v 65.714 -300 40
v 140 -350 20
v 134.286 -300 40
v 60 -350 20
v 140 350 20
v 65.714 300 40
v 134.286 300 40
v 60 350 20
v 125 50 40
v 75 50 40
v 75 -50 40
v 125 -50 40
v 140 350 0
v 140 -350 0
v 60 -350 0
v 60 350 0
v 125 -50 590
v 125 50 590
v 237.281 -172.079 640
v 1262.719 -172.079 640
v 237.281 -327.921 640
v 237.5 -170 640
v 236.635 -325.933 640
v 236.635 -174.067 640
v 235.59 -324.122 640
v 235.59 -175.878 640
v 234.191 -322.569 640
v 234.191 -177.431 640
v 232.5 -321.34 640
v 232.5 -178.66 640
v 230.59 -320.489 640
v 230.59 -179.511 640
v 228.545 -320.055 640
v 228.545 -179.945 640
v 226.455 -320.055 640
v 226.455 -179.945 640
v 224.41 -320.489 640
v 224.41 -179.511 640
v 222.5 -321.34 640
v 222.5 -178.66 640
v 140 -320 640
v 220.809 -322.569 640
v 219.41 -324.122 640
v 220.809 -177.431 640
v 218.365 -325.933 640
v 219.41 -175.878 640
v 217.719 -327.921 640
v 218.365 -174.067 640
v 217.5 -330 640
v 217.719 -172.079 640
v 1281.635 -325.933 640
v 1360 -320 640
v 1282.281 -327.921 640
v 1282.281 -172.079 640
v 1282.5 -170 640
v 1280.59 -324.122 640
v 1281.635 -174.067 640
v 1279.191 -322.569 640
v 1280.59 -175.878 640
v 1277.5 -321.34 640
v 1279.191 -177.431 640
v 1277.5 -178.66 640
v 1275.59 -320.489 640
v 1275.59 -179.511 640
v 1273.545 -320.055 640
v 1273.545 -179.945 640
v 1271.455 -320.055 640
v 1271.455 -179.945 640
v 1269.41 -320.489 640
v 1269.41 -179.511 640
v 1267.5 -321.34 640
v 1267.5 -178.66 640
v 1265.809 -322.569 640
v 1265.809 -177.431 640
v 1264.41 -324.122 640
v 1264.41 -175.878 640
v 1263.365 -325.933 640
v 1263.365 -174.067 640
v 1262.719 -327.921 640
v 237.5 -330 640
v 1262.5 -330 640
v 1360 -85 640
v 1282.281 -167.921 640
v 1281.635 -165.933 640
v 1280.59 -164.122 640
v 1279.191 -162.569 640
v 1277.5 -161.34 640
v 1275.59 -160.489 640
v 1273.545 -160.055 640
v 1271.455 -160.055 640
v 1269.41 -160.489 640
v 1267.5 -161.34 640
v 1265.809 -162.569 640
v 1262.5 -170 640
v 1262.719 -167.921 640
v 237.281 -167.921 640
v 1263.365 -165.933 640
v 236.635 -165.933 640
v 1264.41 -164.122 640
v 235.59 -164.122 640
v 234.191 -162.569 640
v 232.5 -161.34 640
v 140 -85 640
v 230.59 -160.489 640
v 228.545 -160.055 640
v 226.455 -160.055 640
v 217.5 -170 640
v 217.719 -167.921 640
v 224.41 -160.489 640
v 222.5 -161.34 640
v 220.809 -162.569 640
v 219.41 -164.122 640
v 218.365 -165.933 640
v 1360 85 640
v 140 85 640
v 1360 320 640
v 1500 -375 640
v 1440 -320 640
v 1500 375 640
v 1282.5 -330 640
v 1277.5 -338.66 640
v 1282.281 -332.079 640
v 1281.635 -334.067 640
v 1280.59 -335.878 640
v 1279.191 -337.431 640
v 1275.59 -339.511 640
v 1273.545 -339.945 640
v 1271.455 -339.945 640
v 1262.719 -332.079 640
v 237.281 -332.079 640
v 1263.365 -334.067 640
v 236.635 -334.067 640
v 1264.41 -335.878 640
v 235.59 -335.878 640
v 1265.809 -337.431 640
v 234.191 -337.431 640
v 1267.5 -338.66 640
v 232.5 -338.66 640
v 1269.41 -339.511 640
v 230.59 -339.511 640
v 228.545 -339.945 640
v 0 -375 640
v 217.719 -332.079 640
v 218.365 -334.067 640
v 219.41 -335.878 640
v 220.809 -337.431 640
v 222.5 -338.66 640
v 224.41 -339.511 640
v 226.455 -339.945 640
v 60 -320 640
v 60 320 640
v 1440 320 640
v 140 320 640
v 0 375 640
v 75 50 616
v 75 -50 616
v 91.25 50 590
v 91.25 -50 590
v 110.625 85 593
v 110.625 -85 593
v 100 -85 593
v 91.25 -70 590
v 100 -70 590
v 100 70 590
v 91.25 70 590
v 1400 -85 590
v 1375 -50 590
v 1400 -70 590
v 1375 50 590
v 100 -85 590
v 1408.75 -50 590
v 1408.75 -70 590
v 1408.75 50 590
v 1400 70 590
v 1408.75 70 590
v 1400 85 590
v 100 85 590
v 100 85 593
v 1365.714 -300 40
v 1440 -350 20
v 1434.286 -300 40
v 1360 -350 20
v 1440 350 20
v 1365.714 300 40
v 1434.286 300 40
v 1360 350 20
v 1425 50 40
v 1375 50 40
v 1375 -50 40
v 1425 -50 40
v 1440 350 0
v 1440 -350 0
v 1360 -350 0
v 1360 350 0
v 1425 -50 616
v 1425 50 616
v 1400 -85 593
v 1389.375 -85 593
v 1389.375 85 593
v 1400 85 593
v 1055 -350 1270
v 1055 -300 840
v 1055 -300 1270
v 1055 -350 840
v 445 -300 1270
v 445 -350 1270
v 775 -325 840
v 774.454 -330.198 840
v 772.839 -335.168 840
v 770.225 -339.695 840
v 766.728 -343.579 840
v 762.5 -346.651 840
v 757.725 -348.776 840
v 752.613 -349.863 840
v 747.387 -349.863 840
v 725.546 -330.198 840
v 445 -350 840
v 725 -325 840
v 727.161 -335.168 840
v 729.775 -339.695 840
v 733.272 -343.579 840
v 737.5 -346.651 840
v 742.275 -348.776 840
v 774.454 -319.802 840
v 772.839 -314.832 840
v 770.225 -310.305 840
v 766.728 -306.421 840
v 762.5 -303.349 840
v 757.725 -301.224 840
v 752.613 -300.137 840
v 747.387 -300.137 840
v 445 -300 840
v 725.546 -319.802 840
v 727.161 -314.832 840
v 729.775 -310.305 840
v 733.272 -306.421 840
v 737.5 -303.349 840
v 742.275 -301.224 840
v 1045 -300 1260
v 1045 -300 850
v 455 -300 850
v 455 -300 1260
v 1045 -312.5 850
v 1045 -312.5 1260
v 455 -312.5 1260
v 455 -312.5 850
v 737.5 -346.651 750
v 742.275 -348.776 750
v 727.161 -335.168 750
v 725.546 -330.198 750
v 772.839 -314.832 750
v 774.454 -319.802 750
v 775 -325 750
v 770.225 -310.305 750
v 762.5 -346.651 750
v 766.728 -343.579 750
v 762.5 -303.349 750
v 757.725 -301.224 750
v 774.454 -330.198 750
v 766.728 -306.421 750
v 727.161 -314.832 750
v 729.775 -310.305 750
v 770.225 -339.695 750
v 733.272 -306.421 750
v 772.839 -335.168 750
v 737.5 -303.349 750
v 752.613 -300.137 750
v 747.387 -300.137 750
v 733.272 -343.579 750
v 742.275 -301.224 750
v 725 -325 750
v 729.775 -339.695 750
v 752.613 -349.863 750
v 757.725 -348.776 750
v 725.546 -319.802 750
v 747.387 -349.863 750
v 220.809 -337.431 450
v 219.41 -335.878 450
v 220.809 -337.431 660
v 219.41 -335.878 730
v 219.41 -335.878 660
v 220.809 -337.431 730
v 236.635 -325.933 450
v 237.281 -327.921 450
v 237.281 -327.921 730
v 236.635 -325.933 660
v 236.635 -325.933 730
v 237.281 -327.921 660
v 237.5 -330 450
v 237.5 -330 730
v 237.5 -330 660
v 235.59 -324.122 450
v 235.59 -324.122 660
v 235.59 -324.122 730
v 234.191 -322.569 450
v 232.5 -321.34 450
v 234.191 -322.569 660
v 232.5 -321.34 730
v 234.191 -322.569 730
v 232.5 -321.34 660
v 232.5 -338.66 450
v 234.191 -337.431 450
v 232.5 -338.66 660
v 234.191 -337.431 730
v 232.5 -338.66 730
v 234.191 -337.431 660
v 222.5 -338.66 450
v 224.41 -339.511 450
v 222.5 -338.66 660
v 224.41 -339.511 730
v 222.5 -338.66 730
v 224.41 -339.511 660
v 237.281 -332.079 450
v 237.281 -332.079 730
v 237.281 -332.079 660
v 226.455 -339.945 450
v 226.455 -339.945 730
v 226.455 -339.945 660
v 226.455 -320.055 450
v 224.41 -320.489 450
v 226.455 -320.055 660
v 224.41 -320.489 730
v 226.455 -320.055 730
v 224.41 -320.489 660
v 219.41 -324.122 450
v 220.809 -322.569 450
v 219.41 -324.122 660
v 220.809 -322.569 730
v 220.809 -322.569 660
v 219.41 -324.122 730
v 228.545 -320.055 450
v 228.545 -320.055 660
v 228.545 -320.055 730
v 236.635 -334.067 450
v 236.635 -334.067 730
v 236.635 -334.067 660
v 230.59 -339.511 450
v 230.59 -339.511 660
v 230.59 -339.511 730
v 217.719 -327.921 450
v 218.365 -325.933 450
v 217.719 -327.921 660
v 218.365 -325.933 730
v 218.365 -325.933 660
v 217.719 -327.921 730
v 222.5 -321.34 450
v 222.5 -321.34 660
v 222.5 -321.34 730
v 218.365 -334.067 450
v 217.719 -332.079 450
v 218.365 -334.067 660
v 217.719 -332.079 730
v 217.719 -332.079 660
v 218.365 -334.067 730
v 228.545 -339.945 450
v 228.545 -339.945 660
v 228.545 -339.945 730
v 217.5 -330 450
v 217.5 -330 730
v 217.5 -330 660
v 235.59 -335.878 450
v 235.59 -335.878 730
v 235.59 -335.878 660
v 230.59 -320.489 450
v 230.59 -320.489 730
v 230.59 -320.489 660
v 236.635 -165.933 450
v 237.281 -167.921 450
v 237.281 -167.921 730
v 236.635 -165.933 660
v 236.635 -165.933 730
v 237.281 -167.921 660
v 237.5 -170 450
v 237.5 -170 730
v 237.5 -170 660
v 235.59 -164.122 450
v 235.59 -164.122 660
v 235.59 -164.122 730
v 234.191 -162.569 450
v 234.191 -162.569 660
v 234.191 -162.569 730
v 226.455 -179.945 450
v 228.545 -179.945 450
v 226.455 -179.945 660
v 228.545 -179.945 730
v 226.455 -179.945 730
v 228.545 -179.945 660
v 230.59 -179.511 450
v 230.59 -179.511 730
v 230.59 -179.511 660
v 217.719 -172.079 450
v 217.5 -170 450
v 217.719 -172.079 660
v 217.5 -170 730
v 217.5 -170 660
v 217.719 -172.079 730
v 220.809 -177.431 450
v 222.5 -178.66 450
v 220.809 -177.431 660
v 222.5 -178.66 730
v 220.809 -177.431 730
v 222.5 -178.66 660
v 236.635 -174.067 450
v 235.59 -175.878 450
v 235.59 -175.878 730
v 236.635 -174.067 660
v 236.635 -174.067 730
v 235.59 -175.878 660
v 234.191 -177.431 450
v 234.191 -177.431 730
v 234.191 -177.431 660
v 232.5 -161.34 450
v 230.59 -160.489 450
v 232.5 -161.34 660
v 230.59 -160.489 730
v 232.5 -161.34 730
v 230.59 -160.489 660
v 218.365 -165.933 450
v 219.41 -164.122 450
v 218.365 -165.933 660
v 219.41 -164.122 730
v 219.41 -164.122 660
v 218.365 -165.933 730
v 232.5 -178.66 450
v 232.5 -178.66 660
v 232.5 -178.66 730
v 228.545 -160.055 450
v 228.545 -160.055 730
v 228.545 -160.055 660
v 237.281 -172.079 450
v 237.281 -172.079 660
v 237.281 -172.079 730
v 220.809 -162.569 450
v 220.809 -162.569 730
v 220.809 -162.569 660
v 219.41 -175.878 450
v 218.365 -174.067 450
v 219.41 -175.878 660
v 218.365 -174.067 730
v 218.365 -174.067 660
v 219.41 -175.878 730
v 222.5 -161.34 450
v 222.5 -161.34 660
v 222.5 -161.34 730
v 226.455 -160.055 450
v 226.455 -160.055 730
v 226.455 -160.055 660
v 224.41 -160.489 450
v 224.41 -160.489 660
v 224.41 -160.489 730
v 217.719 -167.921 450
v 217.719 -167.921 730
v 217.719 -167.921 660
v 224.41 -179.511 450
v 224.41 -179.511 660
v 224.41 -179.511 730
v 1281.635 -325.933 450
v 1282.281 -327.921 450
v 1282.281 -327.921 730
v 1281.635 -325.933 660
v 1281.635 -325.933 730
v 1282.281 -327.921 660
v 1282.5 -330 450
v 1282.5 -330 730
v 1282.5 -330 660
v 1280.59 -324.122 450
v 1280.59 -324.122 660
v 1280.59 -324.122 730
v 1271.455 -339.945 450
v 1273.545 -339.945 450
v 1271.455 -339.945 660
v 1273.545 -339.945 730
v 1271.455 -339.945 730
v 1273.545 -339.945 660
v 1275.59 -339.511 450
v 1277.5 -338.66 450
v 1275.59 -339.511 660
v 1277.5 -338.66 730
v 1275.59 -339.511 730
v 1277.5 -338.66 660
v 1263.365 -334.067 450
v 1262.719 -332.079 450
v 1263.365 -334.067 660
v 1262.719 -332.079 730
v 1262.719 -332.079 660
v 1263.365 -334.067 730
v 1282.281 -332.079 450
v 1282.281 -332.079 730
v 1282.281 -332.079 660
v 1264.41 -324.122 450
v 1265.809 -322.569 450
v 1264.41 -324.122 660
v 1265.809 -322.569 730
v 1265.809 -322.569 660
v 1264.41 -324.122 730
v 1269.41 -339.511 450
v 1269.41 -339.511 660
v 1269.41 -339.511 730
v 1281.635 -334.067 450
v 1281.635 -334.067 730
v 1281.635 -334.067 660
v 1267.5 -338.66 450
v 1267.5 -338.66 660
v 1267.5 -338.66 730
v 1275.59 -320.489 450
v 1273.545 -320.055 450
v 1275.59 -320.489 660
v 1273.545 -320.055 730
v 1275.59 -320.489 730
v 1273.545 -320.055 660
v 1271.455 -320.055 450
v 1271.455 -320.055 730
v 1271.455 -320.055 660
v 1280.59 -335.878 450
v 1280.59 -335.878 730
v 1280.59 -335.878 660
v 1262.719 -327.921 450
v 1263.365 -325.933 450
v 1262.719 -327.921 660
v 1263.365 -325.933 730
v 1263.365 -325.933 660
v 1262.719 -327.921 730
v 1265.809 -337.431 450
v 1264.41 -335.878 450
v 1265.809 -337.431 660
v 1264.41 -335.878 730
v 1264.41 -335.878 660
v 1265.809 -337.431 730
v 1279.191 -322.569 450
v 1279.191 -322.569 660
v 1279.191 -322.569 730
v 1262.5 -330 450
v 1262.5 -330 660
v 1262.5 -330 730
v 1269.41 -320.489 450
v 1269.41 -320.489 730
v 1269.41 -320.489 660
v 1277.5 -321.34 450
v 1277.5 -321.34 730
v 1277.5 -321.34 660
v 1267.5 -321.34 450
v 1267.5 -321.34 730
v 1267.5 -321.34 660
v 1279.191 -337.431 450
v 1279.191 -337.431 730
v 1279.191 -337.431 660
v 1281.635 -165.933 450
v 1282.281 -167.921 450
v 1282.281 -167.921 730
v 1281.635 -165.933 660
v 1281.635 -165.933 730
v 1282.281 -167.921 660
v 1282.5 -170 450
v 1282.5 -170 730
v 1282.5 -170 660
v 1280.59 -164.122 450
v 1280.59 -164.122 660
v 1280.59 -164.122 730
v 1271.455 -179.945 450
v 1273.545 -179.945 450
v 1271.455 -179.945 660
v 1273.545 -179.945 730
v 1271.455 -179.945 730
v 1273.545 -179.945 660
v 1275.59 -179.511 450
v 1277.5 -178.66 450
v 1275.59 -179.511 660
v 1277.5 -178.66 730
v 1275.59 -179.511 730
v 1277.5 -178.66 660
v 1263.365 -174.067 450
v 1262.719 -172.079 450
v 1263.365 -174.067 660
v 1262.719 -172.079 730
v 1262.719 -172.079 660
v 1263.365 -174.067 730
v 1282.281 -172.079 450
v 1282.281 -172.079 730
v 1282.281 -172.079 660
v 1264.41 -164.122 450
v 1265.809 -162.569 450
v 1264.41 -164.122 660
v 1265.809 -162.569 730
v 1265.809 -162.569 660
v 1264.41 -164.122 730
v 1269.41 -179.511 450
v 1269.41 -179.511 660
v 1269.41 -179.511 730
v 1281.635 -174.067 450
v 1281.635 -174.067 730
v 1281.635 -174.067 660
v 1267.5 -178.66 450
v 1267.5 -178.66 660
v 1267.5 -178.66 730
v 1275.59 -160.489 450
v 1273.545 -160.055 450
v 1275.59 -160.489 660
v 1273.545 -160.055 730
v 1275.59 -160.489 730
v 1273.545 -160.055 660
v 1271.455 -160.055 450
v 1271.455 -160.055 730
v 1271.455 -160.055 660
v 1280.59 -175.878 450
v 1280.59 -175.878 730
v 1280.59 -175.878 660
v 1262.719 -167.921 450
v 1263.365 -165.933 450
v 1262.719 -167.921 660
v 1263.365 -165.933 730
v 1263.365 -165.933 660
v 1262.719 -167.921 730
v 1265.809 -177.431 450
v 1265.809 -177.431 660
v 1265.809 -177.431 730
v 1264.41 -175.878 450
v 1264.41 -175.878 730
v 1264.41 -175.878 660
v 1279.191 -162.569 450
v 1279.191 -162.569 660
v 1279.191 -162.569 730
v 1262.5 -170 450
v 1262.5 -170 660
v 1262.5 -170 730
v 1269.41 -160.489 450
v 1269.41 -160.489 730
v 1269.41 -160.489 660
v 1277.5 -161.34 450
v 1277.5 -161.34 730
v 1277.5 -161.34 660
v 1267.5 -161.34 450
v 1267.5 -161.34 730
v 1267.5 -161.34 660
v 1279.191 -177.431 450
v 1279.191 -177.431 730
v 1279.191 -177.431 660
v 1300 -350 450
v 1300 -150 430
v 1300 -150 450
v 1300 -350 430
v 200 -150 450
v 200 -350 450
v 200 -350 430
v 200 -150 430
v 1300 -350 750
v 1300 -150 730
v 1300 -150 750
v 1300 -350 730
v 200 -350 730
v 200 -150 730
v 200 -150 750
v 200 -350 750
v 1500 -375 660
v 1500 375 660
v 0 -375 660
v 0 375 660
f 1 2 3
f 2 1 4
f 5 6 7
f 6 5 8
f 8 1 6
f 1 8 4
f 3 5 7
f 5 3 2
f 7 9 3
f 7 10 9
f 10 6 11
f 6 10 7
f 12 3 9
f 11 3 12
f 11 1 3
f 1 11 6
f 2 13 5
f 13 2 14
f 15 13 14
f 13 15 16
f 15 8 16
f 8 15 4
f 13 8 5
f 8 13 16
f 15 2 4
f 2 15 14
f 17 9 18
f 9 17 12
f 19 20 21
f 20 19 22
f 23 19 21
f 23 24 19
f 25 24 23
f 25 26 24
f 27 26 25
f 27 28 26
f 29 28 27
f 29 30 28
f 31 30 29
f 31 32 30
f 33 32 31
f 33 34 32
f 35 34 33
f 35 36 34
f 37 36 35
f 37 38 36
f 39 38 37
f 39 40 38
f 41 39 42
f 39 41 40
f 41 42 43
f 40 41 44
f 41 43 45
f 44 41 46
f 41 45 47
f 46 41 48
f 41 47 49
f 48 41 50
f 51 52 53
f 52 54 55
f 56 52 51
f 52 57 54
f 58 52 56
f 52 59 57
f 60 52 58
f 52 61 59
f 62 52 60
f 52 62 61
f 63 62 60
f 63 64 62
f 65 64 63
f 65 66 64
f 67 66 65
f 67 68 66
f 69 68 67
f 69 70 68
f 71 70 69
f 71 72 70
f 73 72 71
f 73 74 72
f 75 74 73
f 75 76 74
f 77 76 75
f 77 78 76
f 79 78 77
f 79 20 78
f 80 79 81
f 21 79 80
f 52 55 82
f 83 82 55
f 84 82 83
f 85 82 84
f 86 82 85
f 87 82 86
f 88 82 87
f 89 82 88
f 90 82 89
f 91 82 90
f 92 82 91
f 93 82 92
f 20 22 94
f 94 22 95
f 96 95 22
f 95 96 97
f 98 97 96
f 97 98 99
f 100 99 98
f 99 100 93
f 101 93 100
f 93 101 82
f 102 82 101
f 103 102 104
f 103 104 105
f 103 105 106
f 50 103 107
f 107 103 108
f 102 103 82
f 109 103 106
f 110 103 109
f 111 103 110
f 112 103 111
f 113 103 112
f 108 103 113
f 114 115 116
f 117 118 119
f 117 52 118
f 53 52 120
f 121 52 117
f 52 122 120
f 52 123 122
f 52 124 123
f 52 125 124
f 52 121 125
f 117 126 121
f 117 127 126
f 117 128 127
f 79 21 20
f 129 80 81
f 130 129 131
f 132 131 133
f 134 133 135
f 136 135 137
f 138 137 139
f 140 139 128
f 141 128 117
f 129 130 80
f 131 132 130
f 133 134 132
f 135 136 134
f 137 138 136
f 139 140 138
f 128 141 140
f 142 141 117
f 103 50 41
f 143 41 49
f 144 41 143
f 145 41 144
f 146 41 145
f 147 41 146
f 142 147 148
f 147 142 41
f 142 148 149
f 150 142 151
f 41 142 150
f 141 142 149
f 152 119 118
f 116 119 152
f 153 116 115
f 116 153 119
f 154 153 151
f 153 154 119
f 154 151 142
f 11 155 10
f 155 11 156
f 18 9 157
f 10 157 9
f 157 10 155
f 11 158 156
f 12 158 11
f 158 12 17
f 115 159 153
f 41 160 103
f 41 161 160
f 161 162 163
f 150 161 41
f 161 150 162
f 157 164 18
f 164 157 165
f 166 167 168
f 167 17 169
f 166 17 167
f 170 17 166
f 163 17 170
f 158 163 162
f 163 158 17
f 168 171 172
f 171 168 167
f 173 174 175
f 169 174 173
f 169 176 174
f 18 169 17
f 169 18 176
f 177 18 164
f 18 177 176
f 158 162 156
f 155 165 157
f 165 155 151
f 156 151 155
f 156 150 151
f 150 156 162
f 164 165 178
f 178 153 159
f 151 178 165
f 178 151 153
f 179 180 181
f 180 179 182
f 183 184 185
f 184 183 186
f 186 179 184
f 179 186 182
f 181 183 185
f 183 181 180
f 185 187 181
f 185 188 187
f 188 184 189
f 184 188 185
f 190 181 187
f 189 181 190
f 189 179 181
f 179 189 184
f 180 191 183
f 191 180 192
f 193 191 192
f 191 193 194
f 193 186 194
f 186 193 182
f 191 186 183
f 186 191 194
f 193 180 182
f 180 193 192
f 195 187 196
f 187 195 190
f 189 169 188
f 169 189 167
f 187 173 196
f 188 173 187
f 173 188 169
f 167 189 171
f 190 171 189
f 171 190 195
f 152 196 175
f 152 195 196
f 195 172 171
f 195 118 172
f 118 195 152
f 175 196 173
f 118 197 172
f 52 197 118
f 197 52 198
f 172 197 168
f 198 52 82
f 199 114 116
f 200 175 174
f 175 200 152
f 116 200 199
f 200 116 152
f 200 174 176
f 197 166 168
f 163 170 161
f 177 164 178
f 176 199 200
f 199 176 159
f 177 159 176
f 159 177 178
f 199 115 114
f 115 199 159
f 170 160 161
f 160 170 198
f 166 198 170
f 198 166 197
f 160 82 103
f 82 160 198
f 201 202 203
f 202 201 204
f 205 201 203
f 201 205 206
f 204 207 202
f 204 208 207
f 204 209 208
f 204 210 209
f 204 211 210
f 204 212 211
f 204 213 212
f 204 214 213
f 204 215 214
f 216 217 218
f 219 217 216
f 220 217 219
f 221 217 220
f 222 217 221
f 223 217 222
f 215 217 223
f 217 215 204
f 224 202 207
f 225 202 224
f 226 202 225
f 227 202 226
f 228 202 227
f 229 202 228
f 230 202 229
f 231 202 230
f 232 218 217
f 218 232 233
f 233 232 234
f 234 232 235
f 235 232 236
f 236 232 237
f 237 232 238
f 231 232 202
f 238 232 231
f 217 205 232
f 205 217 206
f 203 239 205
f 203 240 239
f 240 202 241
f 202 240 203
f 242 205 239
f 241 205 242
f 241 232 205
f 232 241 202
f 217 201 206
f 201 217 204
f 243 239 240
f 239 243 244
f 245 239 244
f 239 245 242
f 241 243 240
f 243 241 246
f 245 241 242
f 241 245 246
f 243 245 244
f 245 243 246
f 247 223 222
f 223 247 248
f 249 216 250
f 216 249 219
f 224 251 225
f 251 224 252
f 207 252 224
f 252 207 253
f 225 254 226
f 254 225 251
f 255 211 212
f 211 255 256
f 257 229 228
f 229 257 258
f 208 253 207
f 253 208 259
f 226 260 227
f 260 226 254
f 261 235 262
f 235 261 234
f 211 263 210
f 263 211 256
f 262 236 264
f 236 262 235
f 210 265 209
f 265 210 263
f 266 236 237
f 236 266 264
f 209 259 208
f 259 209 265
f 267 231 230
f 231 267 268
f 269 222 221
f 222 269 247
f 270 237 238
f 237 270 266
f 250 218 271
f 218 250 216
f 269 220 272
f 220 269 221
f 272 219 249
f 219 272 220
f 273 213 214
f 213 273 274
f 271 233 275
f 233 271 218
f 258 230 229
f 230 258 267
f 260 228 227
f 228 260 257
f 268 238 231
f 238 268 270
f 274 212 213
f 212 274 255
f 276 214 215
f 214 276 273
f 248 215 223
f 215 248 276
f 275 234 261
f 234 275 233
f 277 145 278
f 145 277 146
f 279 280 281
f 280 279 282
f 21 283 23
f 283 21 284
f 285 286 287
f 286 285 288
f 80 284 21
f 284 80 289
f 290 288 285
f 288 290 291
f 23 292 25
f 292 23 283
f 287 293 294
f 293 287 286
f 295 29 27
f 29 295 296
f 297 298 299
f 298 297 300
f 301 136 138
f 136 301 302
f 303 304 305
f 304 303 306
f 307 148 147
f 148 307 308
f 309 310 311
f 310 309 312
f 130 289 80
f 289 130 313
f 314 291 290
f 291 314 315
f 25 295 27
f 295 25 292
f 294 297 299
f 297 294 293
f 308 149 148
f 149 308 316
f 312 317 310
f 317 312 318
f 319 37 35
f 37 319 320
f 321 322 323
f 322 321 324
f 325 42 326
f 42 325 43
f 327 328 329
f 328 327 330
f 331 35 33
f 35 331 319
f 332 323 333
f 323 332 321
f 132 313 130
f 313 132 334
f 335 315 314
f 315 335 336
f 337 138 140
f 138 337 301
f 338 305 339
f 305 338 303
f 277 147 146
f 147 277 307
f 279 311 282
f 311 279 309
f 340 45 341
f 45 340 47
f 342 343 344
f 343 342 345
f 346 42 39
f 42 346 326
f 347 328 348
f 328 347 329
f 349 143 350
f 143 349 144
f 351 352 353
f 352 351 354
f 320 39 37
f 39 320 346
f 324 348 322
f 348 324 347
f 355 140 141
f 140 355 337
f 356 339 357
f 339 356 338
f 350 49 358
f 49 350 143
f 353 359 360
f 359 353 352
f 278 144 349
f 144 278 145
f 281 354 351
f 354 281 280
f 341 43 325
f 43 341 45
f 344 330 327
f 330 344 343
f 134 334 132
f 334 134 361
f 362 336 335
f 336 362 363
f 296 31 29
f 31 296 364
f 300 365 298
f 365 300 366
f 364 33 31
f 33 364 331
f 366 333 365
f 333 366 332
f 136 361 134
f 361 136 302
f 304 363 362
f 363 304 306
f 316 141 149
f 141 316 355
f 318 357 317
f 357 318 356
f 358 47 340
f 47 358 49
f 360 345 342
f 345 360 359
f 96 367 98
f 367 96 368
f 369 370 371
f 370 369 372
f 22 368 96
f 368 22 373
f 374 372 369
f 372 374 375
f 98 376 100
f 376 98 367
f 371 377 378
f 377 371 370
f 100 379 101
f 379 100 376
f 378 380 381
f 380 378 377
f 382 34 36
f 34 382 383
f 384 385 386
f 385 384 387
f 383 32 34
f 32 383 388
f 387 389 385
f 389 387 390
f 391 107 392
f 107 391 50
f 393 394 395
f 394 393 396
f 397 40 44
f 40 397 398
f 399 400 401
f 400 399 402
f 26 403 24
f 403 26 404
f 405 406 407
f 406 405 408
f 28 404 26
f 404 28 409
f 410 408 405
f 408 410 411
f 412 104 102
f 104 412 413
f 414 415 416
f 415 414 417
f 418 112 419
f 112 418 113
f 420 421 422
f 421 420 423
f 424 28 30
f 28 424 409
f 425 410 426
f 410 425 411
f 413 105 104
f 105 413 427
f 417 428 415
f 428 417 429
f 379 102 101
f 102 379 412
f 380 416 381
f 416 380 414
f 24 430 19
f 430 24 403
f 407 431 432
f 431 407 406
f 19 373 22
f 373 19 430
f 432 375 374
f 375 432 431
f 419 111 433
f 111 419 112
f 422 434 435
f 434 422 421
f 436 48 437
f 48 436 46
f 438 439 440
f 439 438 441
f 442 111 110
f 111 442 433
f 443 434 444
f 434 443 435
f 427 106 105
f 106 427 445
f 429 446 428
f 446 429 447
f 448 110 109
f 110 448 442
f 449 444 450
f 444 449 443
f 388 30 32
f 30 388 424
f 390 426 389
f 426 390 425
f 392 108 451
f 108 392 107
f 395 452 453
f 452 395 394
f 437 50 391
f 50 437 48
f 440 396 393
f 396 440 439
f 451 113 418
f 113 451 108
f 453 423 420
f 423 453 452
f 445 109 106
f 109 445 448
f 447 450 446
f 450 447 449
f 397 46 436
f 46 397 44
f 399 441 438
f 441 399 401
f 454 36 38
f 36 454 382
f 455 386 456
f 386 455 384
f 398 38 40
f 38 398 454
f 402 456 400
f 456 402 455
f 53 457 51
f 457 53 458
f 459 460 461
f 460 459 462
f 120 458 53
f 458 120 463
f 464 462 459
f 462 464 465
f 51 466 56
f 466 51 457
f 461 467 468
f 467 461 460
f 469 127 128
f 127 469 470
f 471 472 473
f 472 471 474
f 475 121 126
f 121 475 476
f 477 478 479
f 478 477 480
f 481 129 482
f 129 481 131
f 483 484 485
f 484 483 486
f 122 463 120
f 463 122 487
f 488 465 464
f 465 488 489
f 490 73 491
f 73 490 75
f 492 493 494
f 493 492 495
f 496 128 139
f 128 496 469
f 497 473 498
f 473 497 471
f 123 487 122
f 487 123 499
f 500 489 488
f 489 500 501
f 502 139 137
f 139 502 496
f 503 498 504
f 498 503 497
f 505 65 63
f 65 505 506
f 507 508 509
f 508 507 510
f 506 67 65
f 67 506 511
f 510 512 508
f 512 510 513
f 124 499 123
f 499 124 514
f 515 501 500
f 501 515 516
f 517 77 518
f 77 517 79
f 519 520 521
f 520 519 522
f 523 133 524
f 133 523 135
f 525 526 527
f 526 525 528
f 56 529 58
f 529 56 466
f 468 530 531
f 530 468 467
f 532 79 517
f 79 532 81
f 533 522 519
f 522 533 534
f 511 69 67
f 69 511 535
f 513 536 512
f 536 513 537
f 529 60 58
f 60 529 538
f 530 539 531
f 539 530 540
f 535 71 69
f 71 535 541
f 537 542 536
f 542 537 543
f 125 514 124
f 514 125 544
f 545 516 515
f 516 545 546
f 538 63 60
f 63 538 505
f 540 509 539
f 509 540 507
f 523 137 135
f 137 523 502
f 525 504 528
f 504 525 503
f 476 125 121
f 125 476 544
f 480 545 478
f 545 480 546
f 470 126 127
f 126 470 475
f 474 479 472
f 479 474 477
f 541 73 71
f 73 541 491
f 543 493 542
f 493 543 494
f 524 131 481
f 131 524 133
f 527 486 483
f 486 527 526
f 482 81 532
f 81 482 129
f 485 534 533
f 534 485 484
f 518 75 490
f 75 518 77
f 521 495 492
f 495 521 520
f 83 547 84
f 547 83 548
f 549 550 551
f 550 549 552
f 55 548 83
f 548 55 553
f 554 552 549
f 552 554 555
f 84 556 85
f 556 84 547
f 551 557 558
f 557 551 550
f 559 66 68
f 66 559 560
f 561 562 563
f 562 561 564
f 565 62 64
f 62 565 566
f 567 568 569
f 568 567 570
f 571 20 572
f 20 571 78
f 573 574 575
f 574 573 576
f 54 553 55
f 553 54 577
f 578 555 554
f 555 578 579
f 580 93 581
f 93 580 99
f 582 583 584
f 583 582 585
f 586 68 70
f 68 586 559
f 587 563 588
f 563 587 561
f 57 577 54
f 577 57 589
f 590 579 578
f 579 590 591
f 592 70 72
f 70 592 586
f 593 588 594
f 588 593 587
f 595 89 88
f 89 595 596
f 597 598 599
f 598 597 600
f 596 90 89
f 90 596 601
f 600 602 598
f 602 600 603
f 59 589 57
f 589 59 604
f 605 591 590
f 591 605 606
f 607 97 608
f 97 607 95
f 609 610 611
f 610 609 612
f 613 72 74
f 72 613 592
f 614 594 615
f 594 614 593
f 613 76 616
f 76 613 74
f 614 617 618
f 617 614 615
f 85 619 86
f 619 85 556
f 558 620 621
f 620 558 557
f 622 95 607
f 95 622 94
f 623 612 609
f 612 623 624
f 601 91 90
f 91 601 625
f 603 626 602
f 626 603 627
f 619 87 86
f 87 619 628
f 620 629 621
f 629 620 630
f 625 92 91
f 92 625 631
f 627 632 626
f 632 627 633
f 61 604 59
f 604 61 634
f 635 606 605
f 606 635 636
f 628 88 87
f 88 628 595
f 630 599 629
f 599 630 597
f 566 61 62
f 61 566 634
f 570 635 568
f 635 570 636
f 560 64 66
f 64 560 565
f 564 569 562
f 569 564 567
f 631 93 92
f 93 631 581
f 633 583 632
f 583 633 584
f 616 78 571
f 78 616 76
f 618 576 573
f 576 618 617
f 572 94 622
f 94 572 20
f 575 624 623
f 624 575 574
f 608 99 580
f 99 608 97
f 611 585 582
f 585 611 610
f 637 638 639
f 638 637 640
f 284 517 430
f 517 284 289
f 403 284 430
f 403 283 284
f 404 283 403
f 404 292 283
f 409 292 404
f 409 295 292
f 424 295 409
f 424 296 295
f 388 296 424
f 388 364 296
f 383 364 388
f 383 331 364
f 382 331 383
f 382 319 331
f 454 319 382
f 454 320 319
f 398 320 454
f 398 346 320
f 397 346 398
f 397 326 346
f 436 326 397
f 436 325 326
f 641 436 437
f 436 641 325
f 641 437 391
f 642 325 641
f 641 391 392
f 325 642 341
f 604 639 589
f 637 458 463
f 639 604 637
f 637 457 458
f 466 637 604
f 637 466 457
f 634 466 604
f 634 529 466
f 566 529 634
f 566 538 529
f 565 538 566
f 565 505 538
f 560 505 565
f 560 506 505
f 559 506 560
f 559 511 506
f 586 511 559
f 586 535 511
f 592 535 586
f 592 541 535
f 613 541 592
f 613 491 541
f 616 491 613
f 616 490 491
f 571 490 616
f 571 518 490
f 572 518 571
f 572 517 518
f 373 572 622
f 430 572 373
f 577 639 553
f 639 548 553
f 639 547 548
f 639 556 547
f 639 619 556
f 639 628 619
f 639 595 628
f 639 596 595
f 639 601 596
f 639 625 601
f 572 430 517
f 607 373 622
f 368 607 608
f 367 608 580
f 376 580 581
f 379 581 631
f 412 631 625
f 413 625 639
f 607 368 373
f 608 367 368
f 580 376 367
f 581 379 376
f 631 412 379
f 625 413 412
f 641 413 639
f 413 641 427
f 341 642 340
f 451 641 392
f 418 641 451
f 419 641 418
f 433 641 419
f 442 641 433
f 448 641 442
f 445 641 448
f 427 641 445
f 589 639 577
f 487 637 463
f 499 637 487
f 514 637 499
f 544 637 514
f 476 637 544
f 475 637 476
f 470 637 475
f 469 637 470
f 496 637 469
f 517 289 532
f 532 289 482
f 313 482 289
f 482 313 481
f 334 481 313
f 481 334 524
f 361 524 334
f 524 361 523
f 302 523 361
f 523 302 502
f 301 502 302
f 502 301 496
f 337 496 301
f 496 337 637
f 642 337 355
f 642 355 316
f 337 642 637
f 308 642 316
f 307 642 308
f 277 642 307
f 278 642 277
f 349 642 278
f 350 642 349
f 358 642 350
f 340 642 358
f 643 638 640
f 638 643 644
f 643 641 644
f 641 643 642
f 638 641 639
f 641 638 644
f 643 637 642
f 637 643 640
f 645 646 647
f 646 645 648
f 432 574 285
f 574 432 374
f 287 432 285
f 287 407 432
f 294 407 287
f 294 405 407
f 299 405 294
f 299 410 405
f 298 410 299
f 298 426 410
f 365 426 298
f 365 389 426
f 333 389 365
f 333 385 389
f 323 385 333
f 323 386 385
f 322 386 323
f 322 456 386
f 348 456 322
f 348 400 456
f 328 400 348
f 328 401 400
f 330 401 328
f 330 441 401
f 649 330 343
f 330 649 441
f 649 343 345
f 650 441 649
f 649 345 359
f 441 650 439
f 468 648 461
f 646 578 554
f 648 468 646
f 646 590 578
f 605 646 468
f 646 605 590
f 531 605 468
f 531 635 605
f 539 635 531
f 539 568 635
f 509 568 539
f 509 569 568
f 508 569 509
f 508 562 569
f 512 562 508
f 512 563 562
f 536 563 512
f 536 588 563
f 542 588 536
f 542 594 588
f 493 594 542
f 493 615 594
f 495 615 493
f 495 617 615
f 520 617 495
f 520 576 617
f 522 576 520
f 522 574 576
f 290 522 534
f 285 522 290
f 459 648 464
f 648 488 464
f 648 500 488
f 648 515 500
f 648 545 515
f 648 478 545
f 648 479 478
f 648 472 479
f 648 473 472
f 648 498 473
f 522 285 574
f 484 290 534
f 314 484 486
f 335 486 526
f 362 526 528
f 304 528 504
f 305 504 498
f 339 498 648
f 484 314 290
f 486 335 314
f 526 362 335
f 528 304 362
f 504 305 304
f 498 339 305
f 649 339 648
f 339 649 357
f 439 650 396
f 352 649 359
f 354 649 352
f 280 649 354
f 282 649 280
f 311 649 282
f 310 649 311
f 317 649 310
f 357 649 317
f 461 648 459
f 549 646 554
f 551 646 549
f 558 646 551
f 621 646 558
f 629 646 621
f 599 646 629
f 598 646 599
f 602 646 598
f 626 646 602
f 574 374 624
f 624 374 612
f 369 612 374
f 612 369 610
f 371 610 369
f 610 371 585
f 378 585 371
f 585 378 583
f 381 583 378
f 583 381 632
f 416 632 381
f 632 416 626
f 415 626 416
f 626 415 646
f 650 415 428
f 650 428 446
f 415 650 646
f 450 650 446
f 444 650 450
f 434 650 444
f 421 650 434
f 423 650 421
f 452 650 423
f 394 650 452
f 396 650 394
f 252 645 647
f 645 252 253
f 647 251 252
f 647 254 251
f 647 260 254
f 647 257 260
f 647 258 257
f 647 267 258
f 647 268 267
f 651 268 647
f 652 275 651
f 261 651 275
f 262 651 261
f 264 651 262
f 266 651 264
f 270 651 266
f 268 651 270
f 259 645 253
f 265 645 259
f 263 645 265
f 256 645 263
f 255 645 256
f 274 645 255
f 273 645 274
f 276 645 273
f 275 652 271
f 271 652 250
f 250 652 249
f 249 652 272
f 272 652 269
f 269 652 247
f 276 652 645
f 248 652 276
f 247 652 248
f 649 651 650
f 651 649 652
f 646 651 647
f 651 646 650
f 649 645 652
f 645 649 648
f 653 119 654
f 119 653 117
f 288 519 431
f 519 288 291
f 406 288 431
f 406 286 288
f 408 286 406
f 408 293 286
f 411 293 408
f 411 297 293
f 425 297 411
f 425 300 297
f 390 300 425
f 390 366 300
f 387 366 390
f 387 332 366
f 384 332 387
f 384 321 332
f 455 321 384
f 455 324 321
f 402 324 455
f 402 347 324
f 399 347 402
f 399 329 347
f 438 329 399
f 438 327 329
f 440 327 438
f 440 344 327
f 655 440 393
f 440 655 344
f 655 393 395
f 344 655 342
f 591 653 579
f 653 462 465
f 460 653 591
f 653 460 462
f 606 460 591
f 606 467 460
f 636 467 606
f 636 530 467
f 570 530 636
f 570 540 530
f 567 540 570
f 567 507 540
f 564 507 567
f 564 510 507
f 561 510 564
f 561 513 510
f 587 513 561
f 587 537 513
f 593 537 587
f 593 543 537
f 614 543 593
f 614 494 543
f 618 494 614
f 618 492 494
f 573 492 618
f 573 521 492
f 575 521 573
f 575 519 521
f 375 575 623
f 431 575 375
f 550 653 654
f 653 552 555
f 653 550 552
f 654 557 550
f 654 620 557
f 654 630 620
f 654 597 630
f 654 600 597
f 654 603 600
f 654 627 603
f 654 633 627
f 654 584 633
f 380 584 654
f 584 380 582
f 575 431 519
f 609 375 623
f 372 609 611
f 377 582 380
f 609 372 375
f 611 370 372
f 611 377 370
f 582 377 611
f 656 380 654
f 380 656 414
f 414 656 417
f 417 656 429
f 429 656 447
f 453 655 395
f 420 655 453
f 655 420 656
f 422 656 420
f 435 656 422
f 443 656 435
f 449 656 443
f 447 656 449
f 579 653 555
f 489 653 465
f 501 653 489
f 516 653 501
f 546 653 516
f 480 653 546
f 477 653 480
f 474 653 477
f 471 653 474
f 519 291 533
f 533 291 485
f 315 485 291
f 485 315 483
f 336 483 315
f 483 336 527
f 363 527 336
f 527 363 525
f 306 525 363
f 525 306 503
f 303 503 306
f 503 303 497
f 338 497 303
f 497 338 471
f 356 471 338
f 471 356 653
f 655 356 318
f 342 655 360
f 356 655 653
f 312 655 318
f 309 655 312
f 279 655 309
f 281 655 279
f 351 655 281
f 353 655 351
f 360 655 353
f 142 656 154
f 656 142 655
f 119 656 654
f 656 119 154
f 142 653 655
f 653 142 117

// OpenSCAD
// file: ../gospel.scad
/**
 * GOSPEL: George's OpenSCAD Procedural Enhancement Library
 * @author glaza
 *
 * Index:
 *      Translation: x, y, z, xy, xz, yz, xyz (displacement, variation)
 *      Scaling:     sx, sy, sz, sxy, sxz, syz, s (factor, variation)
 *      Rotation:    rx, ry, rz (angle, variation)
 *      Duplication: dx, dy, dz ()
 */
use <3rd_party/threads-library-by-cuiso-v1.scad>

/**
 * Translates the children in the X,Y,Z direction
 * @param d Displacement in X,Y,Z direction
 * @param variation The random variation + or - added to the displacement * 
 *  x      Translate X
 *  y      Translate Y
 *  z      Translate Z
 *  xy     Translate equaly in X and Y
 *  xz     Translate equaly in X and Z
 *  yz     Translate equaly in Y and Z
 *  xyz    Translate equaly in X, Y and Z
 */
function rand(value, variation=0) = value + rands(-variation,variation,1)[0]; 
 
module x(dx, variation=0) 
{   
    vx = rands(-variation,variation,1)[0];
    translate([dx+vx,0,0])
    children();
}
module y(dy, variation=0) 
{   
    vy = rands(-variation,variation,1)[0];
    translate([0,dy+vy,0])
    children();
} 
module z(dz, variation=0) 
{   
    vz = rands(-variation,variation,1)[0];
    translate([0,0,dz+vz])
    children();
}
module xy(d, variation=0) 
{   
    x(d, variation)
    y(d, variation)
    children();
}
module yz(d, variation=0) 
{   
    z(d, variation)
    y(d, variation)
    children();
}
module xz(d, variation=0) 
{   
    x(d, variation)
    z(d, variation)
    children();
}
module xyz(d, variation=0) 
{   
    xy(d, variation)
    z(d, variation)
    children();
}

/**
 * Rotates the children around the X axis
 * @param angle Degrees to rotate around the X axis
 * @param variation The random variation + or - added
 *  rx     Rotate around X
 *  ry     Rotate around Y
 *  rz     Rotate around Z
 */
module rx(angle, variation=0) 
{   
    v = rands(-variation,variation,1)[0];
    rotate([angle+v,0,0])
    children();
}
module ry(angle, variation=0) 
{   
    v = rands(-variation,variation,1)[0];
    rotate([0,angle+v,0])
    children();
}
module rz(angle, variation=0) 
{   
    v = rands(-variation,variation,1)[0];
    rotate([0,0,angle+v])
    children();
}

/**
 * Duplicates the children across the different planes.
 *      dx: YZ plane, dy: XZ plane, dz: XY plane
 */
module dx() 
{
    mirror([1,0,0])
    children();

    children();
}
module dy() 
{
    mirror([0,1,0])
    children();

    children();
}
module dz() 
{
    mirror([0,0,1])
    children();

    children();
}

/**
 * Mirrors across diferent planes.
 *      mx: YZ plane, my: XZ plane, mz: XY plane
 */
module mx() 
{
    mirror([1,0,0])
    children();
}
module my() 
{
    mirror([0,1,0])
    children();
}
module mz() 
{
    mirror([0,0,1])
    children();
}

/**
 * Scales in different directions
 *      mx: YZ plane, my: XZ plane, mz: XY plane
 */
module sx(factor, variation=0) 
{
    scaleFactor = rand(factor, variation);
    scale([scaleFactor,1,1])
    children();
}
module sy(factor, variation=0) 
{
    scaleFactor = rand(factor, variation);
    scale([1,scaleFactor,1])
    children();
}
module sz(factor, variation=0) 
{
    scaleFactor = rand(factor, variation);
    scale([1,1,scaleFactor])
    children();
}
module sxy(factor, variation=0) 
{
    sx(factor, variation)
    sy(factor, variation)
    children();
}
module syz(factor, variation=0) 
{
    sz(factor, variation)
    sy(factor, variation)
    children();
}
module sxz(factor, variation=0) 
{   
    sx(factor, variation)
    sz(factor, variation)
    children();
}
module s(factor, variation=0) 
{   
    sxy(factor, variation)
    sz(factor, variation)
    children();
}

/**
 * Shortcuts
 */
module diff() //does not work
{
    difference()
    {
        children();
    }
}


/**
 * Colours
 */
module red()     { color("Red") children(); }
module blue()    { color("RoyalBlue") children(); }
module green()   { color("Green") children(); }
module black()   { color("Black") children(); }
module white()   { color("White") children(); }
module cyan()    { color("Cyan") children(); }
module magenta() { color("Magenta") children(); }
module yellow()  { color("Yellow") children(); }
module glass()   { color([0.5, 0.5, 1], 0.25) children(); }

/**
 * shapes
 * @param size A vector passed to the cube
 * @param r The radius of the sphere
 * @param half Whether all corners or only top ones
 */
module rounded(size, r, half)
{
    radius = half
        ? min(r, 0.999*min(size[0]/2, size[1]/2, size[2]))
        : min(r, 0.999*min(size)/2);
    
    diameter = 2*radius;
    width = size[0] - diameter;
    height = size[1] - diameter;
    depth = half 
        ? (size[2] - radius) 
        : size[2] - diameter;
    shift = half ? radius : 0; 
    
    intersection()
    {
        z(-shift)
        xyz(radius)
        minkowski()
        {
            sphere(radius);
            cube([width,height,depth]);
        }
        
        cube(size);
    }
}

module screw(d, h, center=false) {
    z(center ? -h : 0)
    thread_for_screw(diameter=d - 1, length=h);
}

module thread(d, h, center=false) {
    z(center ? -h : 0)
    thread_for_nut(diameter=d, length=h); 
}
// main file
include <../gospel.scad>

DESK_WIDTH = 1500;
DESK_HEIGHT = 640;
DESK_DEPTH = 750;
DRAWER_HEIGHT = 150;
FRAME_WIDTH = 100;
MONITOR_SIZE = [610, 50, 430];
PANEL_SIZE = [590, 25, 410];
MONITOR_STAND_RADIUS = 25;
MONITOR_STAND_HEIGHT = 100;
PLYWOOD_THICKNESS = 20;
SHELF_SIZE = [DESK_WIDTH - 400, 200, PLYWOOD_THICKNESS];

LIGHT_WOOD = "#deb887";
MEDIUM_WOOD = "#8b6914";
DARK_WOOD = "#443022";
DRAWRS_COLOR = LIGHT_WOOD;



color("white")
legs(DESK_WIDTH, DESK_HEIGHT);

z(DESK_HEIGHT)
top([DESK_WIDTH, DESK_DEPTH, PLYWOOD_THICKNESS]);

x(DESK_WIDTH/2)
y(MONITOR_SIZE.y-DESK_DEPTH/2)
z(DESK_HEIGHT + 100)
monitor();

x(SHELF_SIZE.x/2 + 200)
y(-250)
z(DESK_HEIGHT - 200)
shelf();

x(SHELF_SIZE.x/2 + 200)
y(-250)
z(DESK_HEIGHT + 100)
sz(-1)
shelf();

module monitor() {
    z(MONITOR_SIZE.z / 2)
    z(MONITOR_STAND_HEIGHT) {
        difference() {
            color("black")
            cube(MONITOR_SIZE, center = true);
    
            y(20)
            cube(PANEL_SIZE, center = true);
        }
        
        color("white")
        cube(PANEL_SIZE, center = true);
    }
    
    color("black")
    z(MONITOR_STAND_HEIGHT/2)
    cylinder(r=MONITOR_STAND_RADIUS, h=MONITOR_STAND_HEIGHT, center = true);
}

module shelf() {
    color(LIGHT_WOOD)
    cube(SHELF_SIZE, center = true);
    
    for (i = [-1:2:1]) {
        for (j = [-1:2:1]) {
            x(i*0.95*SHELF_SIZE.x/2)
            y(j*0.8*SHELF_SIZE.y/2)
            color(LIGHT_WOOD)
            cylinder(h=200, r=10);
        }
    }
}

module top(size=[1,1,1]) {
    y(-size.y/2)
    color(DRAWRS_COLOR)
    cube(size);
}


module legs(width, height) {
    x(100) leg(height);
    x(100) y(-170/2) z(height-50) cube([width-200, 170, 50]);
    x(width-100) leg(height);
}

module leg(height) {
    // foot
    z(20) beveledCube([80, 700, 20], 100);
    z(20/2) cube([80, 700, 20], center = true);
    
    // leg
    z(height/2) cube([50, 100, height], center = true);
    
    // arm
    z(height) mz() beveledCube([80, height, 50], 500);    
}

module beveledCube(size=[1,1,1], bevel=0.25) {
    sx(size.x/size.y)
    sxy(sqrt(2))
    rz(45)
    cylinder(h=size.z, d1=size.y, d2=size.y-bevel,  $fn=4);
}
